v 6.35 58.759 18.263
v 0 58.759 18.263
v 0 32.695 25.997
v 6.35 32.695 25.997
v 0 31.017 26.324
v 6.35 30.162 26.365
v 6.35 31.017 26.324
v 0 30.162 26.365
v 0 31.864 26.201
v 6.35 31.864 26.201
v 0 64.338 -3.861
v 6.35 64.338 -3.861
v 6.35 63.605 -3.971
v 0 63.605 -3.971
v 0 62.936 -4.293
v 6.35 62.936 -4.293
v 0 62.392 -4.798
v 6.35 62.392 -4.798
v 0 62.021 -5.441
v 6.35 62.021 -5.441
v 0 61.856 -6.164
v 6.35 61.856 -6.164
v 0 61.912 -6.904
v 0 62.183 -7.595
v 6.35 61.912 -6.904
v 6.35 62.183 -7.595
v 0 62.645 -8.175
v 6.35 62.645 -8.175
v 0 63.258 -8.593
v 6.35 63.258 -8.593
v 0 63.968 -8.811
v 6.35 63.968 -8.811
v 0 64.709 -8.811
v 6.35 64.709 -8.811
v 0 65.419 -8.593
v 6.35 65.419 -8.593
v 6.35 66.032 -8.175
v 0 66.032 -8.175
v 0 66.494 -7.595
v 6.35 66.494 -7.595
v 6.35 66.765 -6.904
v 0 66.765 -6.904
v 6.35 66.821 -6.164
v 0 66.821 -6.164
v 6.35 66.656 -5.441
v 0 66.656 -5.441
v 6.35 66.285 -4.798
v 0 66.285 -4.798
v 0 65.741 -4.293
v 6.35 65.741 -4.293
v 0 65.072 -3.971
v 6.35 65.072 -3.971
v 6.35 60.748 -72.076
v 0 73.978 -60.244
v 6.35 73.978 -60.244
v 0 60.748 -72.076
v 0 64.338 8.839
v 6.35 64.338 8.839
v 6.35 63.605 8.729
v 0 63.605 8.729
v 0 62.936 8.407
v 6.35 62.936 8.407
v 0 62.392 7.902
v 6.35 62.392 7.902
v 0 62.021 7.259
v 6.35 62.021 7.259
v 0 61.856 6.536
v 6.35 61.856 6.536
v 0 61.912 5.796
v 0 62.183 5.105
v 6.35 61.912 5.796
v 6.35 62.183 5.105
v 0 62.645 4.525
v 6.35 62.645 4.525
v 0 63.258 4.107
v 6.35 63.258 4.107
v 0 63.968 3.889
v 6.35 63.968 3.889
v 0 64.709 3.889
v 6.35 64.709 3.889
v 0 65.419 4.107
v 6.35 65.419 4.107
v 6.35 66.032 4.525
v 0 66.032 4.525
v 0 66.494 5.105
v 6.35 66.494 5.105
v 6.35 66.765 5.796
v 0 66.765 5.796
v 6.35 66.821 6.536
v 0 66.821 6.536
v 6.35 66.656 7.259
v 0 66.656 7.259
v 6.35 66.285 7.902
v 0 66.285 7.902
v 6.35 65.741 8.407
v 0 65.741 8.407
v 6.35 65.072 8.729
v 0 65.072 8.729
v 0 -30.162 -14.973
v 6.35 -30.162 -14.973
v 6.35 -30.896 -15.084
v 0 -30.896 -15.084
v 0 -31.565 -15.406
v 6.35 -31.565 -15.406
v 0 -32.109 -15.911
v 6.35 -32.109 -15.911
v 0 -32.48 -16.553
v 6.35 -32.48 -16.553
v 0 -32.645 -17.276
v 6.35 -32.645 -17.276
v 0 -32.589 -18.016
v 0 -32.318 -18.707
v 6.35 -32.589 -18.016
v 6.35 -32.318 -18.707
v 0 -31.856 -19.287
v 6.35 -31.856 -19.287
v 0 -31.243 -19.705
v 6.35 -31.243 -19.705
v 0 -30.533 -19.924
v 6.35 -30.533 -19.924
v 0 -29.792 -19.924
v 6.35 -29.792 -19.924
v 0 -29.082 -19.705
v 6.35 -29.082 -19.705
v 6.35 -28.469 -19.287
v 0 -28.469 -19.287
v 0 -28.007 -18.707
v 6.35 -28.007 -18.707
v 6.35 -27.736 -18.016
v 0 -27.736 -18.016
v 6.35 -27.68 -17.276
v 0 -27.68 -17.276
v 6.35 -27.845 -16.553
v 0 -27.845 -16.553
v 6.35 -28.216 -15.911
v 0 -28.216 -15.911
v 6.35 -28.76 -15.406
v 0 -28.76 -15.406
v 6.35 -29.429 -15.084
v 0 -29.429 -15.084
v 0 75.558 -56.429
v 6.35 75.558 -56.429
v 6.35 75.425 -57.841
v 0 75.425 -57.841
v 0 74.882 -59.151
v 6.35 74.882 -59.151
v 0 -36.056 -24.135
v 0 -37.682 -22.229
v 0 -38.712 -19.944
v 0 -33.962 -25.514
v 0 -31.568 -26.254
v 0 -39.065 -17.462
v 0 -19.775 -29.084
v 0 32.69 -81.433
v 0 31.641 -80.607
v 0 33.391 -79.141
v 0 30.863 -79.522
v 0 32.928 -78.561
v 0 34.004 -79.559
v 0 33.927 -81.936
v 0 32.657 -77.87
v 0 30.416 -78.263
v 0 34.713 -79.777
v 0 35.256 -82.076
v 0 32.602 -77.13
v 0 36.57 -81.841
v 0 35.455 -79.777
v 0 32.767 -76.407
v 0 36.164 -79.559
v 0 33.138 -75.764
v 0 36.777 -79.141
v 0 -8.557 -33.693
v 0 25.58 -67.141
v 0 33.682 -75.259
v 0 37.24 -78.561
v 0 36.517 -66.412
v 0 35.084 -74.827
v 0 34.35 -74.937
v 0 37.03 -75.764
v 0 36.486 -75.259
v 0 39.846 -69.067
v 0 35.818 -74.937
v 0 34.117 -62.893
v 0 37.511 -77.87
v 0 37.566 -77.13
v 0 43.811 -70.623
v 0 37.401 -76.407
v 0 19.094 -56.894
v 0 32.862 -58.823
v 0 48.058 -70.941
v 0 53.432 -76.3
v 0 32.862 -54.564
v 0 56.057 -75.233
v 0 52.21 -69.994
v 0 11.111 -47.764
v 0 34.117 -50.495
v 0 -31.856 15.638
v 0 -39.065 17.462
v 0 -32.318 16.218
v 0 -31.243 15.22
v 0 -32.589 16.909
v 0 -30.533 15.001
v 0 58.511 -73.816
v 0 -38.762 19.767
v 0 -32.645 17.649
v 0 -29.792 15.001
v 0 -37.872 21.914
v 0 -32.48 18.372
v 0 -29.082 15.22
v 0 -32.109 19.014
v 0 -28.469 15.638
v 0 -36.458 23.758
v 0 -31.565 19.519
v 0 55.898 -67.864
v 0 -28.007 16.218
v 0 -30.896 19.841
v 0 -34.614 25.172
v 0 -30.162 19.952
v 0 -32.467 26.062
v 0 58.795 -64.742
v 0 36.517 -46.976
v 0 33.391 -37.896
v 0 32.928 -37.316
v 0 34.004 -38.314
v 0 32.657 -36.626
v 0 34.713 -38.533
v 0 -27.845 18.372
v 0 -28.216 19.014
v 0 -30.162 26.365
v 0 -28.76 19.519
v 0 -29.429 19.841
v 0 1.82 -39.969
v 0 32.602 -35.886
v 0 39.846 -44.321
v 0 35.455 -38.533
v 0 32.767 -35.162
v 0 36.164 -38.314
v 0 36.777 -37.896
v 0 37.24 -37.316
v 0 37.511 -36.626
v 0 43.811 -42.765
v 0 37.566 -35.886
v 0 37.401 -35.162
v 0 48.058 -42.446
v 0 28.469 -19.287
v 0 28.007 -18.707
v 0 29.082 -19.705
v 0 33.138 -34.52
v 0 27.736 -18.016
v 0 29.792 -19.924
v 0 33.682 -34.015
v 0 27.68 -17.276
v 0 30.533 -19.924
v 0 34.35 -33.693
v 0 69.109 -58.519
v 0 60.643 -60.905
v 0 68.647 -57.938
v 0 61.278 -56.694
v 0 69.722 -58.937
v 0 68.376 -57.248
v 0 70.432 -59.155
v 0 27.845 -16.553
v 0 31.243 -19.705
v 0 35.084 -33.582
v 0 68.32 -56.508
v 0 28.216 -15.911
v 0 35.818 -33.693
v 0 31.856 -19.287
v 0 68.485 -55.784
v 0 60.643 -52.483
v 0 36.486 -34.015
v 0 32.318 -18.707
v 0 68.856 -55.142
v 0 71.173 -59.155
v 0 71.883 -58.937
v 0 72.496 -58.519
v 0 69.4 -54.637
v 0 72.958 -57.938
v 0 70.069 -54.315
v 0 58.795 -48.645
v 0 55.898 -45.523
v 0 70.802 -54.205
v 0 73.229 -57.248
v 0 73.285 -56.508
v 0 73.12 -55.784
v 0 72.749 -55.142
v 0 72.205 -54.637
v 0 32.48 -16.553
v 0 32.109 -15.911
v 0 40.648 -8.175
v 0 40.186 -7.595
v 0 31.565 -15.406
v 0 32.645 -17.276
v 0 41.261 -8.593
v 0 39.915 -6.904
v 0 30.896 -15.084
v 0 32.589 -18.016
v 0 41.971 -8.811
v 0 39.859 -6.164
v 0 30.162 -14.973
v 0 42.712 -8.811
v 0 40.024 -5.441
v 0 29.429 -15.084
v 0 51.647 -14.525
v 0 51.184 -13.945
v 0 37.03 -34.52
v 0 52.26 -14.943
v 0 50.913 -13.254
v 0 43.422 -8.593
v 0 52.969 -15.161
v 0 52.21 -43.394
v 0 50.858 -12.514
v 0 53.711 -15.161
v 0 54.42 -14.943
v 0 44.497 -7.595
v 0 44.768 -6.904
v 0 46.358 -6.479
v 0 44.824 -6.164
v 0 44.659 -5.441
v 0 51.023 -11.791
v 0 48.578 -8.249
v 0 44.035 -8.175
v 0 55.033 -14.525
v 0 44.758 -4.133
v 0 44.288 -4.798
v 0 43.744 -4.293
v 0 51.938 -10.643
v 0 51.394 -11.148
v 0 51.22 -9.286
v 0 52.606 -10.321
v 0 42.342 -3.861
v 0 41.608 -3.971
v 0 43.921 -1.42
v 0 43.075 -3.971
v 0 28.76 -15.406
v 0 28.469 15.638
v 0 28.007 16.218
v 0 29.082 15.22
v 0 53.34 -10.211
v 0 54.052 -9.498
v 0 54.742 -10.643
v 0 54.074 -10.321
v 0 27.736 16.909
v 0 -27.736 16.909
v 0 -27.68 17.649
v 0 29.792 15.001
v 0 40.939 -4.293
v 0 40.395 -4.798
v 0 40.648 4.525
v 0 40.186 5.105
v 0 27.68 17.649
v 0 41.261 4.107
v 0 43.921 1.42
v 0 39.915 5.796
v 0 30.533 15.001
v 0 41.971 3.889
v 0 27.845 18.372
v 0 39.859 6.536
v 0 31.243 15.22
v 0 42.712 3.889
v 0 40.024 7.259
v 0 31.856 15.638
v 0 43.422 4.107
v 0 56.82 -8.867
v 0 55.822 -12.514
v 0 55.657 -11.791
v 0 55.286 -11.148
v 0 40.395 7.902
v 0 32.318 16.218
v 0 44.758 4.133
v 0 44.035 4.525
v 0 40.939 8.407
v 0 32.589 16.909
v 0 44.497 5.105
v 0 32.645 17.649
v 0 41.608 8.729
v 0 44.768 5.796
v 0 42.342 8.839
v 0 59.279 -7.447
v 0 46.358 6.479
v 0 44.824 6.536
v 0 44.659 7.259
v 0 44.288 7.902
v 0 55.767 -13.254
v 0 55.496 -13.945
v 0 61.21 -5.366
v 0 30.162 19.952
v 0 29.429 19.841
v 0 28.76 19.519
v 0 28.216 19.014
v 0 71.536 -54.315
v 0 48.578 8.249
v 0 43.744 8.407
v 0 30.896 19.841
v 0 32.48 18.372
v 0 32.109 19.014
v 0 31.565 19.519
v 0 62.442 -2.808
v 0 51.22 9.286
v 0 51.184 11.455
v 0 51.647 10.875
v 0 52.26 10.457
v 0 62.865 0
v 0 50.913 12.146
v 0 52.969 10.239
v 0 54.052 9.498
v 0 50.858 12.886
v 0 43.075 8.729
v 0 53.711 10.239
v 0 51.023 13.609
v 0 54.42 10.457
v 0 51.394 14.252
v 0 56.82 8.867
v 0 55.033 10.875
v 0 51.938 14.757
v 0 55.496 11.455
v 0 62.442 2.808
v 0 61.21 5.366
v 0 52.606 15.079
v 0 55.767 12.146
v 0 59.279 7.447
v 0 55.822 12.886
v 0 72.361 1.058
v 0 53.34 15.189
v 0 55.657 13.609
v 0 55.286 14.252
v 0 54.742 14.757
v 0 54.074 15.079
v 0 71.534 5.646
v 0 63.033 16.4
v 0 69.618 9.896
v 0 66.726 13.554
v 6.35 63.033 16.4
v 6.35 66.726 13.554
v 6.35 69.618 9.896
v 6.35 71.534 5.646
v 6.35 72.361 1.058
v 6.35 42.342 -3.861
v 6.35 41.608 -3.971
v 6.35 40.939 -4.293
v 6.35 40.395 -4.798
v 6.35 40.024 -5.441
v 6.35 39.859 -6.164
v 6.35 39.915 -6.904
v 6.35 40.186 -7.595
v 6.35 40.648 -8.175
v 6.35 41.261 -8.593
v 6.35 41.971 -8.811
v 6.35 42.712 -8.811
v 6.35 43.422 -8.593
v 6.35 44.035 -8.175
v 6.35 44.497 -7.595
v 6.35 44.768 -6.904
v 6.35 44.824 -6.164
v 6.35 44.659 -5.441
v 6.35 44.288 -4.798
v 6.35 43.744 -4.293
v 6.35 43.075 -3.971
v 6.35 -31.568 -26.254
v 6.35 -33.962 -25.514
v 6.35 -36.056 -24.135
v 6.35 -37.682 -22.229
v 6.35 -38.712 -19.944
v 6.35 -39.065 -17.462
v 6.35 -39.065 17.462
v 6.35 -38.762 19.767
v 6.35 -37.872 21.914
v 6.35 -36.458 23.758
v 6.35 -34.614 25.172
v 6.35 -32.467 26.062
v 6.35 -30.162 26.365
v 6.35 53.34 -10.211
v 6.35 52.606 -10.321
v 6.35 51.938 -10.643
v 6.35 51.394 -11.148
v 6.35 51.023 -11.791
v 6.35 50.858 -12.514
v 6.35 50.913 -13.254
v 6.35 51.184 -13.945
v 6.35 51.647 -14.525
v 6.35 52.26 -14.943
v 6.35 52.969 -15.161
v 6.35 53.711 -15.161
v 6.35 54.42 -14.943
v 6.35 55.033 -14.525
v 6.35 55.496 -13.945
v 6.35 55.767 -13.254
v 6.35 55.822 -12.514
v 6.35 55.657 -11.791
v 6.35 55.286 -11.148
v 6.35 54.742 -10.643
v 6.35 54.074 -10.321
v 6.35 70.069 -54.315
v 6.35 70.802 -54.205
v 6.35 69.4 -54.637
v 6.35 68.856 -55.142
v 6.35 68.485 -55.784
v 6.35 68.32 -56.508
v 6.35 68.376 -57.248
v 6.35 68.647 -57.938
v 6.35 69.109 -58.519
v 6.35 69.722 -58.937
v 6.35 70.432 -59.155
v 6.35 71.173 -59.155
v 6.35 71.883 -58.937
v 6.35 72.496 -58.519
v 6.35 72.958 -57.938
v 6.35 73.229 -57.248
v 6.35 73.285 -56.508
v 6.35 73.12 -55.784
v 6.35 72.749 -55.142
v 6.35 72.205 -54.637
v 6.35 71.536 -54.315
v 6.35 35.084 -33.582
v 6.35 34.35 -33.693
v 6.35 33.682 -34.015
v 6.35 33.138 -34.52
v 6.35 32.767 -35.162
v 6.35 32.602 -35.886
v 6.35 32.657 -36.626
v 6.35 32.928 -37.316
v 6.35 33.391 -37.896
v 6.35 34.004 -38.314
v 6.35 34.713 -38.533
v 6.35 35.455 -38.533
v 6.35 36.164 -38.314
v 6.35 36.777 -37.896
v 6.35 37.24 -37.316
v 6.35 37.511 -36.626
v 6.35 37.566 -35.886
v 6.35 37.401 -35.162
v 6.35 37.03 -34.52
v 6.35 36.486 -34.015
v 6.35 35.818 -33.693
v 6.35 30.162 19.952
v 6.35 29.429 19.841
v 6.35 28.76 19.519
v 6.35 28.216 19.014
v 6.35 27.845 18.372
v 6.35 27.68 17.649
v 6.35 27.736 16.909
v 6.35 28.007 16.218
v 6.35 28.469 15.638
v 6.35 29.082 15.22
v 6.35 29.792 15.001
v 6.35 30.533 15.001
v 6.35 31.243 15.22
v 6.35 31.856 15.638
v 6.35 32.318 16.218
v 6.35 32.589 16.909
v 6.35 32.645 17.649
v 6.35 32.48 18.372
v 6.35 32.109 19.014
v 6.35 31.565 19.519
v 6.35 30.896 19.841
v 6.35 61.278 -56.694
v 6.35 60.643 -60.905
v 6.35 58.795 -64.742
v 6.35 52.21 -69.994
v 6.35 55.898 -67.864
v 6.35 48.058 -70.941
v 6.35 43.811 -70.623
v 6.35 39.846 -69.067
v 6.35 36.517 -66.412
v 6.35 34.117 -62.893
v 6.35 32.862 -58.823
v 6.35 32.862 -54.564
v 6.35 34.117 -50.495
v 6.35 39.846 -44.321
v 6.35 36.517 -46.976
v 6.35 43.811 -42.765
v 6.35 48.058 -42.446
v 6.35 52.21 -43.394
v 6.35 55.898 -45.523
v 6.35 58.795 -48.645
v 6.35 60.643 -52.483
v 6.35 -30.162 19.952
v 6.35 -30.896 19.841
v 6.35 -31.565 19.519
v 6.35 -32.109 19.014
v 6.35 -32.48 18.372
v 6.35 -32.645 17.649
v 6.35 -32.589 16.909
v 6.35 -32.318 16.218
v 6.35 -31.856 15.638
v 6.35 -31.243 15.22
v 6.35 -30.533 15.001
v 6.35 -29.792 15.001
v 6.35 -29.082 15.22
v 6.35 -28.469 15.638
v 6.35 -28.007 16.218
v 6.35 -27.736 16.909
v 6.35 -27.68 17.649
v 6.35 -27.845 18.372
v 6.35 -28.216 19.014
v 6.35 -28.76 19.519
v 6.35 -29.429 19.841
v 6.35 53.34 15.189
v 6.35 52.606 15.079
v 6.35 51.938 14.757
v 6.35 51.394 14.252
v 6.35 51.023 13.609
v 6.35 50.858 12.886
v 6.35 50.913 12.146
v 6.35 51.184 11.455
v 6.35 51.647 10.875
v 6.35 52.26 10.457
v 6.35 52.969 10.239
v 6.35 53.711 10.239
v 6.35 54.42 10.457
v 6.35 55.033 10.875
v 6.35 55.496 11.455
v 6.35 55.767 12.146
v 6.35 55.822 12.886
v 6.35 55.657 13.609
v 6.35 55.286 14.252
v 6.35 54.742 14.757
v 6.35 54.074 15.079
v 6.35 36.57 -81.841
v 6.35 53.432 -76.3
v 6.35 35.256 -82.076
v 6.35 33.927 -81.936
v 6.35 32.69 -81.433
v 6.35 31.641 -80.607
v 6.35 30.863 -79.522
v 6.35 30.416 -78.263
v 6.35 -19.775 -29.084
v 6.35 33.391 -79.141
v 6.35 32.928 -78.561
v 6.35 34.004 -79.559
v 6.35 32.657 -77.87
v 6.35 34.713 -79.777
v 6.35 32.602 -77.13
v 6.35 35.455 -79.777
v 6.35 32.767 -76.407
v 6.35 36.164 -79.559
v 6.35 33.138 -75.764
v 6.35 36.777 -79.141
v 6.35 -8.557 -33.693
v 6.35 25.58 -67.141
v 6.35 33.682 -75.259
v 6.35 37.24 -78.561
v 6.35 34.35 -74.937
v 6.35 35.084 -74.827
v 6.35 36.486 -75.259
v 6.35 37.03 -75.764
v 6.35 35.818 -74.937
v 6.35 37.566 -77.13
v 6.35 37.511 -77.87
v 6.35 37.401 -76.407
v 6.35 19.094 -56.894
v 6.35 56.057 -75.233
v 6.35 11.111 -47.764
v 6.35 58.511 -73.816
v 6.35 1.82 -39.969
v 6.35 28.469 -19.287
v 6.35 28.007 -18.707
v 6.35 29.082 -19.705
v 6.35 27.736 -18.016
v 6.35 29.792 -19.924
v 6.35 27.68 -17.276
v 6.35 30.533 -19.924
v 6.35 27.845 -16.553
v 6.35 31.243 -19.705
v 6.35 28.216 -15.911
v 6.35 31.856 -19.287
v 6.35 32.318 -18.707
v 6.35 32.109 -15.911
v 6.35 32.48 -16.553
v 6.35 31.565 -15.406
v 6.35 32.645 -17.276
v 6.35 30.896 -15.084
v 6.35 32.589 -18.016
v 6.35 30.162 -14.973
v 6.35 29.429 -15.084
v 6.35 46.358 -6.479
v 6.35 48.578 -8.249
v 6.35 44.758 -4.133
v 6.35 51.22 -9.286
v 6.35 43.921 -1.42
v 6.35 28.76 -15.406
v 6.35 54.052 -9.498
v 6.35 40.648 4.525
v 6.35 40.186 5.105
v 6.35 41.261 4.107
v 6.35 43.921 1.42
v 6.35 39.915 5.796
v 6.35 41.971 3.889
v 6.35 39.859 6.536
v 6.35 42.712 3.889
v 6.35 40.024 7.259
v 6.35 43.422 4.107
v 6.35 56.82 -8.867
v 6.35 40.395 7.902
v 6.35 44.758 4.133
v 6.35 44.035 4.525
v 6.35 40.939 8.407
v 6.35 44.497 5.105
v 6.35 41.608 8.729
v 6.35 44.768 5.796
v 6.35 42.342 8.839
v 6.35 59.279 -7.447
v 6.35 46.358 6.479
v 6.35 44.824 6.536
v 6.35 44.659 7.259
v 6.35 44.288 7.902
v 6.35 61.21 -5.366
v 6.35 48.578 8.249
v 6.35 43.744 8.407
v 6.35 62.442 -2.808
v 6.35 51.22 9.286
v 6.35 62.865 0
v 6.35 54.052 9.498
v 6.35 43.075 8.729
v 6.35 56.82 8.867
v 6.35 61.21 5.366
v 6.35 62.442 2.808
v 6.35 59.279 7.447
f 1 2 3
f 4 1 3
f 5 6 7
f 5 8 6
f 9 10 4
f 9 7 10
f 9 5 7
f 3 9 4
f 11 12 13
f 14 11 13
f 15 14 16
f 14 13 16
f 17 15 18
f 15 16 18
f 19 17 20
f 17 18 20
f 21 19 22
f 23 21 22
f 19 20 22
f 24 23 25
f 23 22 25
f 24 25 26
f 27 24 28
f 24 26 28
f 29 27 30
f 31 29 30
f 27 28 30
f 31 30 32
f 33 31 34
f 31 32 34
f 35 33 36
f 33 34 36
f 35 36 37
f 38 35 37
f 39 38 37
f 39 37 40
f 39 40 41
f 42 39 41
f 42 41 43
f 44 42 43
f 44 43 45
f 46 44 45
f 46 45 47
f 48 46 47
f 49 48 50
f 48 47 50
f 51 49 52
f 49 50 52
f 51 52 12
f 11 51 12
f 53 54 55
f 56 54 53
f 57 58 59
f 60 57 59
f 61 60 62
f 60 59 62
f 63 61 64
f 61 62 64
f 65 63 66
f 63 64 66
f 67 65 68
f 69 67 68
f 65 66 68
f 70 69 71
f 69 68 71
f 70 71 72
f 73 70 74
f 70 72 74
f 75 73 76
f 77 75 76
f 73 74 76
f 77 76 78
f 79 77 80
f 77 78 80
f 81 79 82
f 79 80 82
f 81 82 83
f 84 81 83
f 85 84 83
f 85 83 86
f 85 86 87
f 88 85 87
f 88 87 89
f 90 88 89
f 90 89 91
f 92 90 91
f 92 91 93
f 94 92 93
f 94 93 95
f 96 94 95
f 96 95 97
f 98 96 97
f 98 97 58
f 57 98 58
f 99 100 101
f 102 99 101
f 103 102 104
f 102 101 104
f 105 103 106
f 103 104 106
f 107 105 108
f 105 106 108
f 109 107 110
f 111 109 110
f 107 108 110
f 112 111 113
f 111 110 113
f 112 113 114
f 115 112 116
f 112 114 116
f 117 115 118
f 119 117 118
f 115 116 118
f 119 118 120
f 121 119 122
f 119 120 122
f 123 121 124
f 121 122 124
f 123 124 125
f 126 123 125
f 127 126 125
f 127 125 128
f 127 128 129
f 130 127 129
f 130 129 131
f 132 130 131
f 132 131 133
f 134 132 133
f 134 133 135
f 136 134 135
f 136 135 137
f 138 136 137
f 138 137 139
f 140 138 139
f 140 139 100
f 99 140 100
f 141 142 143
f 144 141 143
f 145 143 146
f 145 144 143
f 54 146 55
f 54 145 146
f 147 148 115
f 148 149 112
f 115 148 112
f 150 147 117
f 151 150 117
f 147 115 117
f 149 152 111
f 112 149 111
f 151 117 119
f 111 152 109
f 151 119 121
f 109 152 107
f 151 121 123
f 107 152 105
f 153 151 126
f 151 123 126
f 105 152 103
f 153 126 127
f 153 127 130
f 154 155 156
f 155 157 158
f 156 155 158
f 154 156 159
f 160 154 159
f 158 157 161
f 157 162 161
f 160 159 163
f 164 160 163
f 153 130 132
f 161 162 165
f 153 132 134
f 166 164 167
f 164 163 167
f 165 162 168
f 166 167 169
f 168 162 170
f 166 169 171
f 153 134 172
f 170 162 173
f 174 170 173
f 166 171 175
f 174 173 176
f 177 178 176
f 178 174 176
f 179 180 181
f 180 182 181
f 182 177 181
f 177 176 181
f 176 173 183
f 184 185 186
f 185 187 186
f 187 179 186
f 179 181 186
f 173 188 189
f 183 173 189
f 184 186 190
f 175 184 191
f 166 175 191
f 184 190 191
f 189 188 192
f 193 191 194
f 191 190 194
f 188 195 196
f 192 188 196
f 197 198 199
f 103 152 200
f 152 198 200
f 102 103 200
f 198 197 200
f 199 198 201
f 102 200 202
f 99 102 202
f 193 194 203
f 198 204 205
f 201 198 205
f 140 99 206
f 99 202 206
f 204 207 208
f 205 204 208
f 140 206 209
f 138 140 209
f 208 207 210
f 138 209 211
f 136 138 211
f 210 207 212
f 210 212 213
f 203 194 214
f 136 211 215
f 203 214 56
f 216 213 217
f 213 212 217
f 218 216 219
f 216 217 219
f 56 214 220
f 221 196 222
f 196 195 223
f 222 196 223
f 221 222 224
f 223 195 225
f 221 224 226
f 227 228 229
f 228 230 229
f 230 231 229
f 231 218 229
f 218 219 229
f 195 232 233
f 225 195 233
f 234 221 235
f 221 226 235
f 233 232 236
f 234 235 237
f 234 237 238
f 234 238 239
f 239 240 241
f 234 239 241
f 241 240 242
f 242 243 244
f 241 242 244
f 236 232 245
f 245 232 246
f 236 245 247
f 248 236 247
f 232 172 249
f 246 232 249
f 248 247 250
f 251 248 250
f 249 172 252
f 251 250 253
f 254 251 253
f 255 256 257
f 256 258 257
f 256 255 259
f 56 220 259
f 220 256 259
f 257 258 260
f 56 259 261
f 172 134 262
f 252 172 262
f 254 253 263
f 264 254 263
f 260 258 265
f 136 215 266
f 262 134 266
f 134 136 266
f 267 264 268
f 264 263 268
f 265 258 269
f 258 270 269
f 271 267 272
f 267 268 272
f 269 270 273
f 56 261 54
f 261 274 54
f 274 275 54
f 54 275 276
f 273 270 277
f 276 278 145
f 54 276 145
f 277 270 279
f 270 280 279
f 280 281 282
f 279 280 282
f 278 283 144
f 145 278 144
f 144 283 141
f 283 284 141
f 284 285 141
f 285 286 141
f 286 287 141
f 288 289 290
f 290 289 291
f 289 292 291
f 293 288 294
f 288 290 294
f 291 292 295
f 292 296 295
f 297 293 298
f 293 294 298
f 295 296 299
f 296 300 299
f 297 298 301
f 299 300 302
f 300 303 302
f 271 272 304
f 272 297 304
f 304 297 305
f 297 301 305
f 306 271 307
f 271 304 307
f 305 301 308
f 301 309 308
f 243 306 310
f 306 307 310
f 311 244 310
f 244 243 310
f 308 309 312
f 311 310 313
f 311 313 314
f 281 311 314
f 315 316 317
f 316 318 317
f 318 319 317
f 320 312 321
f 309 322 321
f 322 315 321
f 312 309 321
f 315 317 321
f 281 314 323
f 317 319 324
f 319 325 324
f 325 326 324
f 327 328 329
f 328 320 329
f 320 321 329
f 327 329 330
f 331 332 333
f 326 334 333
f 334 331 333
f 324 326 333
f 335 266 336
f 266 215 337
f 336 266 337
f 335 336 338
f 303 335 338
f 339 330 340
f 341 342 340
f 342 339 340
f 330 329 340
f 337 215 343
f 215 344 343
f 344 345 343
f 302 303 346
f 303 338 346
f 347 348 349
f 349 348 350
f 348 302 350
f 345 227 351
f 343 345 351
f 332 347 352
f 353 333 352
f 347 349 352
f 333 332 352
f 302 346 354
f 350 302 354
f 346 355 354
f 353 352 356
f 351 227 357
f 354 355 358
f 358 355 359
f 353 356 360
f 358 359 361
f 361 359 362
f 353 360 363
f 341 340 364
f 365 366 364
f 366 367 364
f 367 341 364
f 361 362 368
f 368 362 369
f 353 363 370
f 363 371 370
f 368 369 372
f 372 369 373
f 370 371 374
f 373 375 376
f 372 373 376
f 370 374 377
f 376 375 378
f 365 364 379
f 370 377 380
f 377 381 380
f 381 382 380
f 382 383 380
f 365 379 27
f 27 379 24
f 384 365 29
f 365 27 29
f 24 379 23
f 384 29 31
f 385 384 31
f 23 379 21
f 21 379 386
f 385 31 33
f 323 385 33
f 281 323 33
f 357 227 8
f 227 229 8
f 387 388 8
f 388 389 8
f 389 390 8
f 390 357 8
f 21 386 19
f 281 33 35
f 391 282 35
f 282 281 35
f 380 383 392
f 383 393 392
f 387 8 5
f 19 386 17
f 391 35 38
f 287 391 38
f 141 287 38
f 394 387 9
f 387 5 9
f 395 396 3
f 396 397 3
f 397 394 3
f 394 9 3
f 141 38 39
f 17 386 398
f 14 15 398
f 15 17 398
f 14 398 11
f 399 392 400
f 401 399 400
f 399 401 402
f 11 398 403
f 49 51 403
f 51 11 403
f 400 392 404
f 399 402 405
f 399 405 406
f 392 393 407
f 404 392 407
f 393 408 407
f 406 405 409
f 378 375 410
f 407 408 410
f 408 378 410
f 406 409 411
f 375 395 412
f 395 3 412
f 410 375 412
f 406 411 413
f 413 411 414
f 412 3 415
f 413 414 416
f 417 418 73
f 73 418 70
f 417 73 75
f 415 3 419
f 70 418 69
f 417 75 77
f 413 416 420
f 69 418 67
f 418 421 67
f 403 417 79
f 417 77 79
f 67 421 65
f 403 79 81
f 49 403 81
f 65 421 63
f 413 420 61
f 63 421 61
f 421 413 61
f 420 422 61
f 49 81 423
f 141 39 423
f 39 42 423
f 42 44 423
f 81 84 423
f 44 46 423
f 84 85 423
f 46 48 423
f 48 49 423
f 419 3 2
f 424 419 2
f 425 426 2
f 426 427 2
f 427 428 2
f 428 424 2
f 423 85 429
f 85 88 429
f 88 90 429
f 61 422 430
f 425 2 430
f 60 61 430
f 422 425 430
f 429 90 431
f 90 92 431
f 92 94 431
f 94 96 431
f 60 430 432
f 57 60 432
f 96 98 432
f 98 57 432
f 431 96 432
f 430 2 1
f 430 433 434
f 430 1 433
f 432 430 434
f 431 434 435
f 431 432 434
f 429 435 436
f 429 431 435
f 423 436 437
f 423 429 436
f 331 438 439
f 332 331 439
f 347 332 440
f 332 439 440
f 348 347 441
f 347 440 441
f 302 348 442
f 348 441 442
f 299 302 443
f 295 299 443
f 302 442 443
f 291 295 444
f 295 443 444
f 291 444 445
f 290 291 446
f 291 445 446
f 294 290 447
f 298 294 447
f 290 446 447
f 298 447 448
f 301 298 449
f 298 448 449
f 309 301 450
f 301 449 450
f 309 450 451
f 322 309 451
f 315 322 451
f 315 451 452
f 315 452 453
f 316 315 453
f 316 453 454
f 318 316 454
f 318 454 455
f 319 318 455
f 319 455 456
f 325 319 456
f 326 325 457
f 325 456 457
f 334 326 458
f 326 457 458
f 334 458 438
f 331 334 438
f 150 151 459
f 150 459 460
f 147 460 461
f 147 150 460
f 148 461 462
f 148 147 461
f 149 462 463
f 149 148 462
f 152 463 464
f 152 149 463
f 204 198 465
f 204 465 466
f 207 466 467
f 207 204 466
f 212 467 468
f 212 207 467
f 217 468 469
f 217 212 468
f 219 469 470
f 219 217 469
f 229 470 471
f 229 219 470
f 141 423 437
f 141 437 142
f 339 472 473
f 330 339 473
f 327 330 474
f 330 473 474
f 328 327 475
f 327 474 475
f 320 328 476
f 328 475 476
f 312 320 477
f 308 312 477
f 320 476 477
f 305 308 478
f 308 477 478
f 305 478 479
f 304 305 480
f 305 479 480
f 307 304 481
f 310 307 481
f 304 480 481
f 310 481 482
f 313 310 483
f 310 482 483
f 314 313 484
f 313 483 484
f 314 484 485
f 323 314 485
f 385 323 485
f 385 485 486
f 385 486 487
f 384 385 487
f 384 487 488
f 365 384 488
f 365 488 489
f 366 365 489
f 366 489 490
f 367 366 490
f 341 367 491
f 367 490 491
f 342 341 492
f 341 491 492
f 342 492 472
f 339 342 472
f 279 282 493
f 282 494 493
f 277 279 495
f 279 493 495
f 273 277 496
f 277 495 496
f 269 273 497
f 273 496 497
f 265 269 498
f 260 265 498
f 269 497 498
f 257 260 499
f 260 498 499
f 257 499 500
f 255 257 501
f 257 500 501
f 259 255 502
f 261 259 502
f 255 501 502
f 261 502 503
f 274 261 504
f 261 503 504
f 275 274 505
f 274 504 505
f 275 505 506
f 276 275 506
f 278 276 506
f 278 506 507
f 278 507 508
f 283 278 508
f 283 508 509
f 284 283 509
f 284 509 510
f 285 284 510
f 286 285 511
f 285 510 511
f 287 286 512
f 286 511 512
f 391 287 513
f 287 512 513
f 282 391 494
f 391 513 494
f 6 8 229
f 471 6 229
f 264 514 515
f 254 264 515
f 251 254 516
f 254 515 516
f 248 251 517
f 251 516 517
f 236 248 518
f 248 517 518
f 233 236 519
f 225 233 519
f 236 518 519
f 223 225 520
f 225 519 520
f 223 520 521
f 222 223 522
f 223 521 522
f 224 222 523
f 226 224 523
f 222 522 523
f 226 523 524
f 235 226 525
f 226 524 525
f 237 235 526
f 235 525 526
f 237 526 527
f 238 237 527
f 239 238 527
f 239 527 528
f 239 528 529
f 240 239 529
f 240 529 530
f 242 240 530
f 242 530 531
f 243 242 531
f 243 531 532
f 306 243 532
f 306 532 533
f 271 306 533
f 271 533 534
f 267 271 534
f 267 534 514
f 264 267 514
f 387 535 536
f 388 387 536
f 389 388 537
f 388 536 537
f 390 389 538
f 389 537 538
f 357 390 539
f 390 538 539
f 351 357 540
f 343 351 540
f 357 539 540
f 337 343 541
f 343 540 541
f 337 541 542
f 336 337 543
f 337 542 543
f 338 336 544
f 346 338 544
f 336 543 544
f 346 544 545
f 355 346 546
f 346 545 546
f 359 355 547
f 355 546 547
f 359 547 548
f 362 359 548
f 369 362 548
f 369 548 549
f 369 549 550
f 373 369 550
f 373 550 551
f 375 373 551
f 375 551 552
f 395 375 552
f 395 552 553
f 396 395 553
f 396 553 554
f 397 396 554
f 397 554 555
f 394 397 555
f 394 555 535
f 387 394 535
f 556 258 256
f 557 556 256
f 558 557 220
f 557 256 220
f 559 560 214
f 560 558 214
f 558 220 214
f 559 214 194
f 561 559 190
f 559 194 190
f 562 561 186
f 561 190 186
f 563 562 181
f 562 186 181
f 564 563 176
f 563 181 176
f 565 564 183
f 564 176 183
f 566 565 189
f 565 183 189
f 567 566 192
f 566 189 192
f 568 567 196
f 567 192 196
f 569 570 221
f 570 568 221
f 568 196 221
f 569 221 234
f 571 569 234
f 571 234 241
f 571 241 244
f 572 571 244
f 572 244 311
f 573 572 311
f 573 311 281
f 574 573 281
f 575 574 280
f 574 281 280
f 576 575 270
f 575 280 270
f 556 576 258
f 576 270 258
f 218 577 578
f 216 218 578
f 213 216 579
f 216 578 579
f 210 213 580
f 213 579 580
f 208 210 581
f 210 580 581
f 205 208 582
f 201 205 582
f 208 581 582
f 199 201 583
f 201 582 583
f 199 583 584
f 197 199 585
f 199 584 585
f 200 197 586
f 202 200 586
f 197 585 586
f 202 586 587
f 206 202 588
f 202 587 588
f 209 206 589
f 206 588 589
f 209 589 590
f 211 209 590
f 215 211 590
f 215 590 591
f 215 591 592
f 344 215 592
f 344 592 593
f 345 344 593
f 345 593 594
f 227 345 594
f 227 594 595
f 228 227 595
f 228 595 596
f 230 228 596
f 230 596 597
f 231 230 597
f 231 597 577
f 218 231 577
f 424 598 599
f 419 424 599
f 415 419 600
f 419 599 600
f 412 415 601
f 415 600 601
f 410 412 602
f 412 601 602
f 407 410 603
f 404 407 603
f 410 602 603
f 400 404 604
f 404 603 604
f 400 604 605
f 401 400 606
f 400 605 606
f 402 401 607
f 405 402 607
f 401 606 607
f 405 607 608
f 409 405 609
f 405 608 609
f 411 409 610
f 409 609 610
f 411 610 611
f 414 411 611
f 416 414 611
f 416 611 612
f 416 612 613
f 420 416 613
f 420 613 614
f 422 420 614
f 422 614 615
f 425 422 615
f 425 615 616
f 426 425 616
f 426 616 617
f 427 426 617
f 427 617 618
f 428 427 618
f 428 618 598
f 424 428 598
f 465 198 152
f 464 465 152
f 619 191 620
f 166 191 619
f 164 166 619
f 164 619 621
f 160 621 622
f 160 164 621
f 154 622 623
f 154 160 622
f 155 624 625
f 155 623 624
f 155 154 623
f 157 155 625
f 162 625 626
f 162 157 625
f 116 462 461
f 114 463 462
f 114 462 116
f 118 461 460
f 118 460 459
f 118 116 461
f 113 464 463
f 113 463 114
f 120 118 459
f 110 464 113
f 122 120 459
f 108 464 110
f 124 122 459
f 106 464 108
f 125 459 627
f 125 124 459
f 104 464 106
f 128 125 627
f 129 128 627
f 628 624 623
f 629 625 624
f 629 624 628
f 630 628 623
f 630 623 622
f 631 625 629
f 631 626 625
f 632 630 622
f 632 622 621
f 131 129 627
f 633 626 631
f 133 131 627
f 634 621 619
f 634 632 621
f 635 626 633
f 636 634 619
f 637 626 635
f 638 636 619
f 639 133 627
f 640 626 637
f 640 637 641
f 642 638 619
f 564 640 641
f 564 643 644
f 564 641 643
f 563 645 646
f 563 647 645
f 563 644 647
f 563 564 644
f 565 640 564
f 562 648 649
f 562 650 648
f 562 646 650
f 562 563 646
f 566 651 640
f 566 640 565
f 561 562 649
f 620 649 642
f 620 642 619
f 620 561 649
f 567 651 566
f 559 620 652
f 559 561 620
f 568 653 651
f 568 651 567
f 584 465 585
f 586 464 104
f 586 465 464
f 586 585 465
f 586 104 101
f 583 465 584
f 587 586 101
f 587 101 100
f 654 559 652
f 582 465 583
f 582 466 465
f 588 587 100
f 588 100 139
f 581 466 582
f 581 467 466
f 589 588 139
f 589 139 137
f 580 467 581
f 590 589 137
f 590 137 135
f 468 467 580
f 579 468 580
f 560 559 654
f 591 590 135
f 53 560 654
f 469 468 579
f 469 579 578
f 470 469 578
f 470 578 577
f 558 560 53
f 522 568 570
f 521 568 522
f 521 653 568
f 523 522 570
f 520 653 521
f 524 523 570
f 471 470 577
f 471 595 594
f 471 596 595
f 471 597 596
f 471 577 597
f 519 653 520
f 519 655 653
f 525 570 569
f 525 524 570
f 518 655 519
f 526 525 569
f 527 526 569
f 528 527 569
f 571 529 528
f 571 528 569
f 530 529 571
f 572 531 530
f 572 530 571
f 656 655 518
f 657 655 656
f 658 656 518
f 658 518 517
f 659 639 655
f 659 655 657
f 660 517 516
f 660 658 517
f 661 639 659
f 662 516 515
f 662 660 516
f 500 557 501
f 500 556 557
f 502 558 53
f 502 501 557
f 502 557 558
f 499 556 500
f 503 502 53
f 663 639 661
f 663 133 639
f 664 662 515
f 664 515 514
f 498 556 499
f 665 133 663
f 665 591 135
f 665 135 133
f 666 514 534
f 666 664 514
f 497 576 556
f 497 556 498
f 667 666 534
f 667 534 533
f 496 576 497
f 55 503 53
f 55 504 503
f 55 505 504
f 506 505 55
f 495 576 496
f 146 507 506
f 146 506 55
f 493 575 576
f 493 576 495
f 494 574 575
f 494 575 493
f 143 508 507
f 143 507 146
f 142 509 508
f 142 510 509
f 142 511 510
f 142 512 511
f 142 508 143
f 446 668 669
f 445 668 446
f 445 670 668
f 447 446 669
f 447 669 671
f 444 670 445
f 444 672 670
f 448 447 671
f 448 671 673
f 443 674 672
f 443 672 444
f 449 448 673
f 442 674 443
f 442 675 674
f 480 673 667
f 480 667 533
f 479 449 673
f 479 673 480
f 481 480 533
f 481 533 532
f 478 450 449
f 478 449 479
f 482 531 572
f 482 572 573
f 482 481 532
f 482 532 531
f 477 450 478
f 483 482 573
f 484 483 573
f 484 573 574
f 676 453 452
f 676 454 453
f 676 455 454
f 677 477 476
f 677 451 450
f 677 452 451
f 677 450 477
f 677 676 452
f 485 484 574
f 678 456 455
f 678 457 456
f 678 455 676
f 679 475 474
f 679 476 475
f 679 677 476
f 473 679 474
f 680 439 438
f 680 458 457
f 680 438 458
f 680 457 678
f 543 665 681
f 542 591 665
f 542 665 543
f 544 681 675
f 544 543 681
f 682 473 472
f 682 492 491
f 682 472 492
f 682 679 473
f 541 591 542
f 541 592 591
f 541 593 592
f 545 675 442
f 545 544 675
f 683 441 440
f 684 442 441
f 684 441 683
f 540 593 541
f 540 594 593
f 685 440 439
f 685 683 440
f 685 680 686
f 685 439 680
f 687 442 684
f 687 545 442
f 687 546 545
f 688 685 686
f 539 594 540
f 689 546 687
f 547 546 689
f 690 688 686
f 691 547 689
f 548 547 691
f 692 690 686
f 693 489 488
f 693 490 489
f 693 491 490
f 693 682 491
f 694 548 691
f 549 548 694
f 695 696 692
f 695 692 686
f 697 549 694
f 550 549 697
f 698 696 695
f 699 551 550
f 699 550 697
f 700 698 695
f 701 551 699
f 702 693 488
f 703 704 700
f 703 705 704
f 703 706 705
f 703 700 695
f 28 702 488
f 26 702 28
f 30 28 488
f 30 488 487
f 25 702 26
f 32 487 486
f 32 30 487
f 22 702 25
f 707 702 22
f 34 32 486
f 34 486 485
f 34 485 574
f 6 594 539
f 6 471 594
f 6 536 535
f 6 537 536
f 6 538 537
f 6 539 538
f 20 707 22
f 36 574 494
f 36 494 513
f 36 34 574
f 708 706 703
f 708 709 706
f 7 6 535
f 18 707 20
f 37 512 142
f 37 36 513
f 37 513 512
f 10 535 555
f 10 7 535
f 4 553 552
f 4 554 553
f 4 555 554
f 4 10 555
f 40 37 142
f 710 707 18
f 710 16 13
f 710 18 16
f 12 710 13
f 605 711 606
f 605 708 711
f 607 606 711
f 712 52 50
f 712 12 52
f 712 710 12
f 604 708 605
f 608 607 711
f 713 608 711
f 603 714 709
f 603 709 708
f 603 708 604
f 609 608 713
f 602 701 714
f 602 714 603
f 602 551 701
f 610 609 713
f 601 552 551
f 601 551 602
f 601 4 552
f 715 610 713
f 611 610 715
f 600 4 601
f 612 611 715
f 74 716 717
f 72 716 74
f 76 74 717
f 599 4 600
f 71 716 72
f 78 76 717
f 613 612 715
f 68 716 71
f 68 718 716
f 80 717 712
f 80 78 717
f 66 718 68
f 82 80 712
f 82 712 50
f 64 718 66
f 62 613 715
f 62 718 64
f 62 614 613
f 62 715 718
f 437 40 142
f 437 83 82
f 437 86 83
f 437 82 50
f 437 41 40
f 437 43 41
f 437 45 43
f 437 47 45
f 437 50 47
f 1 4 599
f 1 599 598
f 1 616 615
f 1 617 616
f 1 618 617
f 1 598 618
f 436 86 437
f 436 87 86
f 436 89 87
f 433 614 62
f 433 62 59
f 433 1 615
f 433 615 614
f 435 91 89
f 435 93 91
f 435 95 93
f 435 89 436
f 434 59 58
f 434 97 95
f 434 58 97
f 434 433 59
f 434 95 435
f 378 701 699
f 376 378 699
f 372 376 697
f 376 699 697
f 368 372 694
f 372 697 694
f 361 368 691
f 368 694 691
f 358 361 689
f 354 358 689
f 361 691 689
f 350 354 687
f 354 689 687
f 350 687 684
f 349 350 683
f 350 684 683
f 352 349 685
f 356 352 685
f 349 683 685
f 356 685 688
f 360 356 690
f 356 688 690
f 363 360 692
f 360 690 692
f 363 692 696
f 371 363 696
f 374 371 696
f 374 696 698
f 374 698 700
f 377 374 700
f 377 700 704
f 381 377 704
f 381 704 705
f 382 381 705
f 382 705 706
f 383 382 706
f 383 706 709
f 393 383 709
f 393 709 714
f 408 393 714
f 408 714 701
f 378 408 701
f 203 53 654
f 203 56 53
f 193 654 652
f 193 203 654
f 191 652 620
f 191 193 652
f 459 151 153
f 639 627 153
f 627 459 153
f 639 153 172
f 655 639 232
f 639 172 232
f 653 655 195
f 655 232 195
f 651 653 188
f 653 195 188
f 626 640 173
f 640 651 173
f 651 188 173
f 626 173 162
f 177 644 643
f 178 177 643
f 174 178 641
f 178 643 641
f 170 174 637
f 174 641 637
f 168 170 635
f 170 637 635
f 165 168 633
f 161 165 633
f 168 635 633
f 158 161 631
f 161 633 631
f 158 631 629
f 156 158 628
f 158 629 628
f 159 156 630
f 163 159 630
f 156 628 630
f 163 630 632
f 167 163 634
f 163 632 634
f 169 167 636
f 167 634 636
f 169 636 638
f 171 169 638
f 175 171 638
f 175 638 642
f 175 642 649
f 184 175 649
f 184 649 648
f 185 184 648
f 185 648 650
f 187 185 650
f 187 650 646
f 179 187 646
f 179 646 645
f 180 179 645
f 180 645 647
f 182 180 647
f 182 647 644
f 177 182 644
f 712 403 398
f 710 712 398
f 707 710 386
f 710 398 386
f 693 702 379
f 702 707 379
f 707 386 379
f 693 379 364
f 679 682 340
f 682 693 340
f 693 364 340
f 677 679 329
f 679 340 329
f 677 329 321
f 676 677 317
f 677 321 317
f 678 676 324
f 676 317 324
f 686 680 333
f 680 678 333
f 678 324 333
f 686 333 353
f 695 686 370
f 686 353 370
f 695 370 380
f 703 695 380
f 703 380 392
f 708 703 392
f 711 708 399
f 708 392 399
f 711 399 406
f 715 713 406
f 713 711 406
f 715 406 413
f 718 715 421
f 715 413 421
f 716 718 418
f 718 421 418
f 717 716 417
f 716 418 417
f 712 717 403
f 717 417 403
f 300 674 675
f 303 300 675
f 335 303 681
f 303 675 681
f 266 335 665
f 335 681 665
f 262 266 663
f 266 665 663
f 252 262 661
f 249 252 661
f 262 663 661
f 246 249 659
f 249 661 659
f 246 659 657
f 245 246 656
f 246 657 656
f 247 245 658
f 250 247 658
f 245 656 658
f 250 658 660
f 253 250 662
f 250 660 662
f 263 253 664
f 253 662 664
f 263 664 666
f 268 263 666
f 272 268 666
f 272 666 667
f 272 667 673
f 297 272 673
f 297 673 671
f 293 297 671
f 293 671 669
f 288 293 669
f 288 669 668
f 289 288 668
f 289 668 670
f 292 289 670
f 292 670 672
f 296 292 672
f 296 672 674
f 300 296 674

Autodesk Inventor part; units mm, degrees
ref_plane "YZ Plane" through (0, 0, 0) normal (1, 0, 0) x (0, 1, 0)
ref_plane "XZ Plane" through (0, 0, 0) normal (0, 1, 0) x (-1, 0, 0)
ref_plane "XY Plane" through (0, 0, 0) normal (0, 0, 1) x (1, 0, 0)
sketch "Sketch1" plane through (0, 0, 0) normal (1, 0, 0) x (0, 1, 0)
  circle A0 centre (0, 0) radius 38.1 construction
  line L0 (27.94, -25.903) -> (27.94, -76.2) construction
  line L1 (27.94, -76.2) -> (-27.94, -76.2) construction
  line L2 (-27.94, -76.2) -> (-27.94, -25.903) construction
  line L3 (-30.1625, -17.4625) -> (30.1625, -17.4625) construction
  line L4 (30.1625, -17.4625) -> (30.1625, 17.4625) construction
  line L5 (30.1625, 17.4625) -> (-30.1625, 17.4625) construction
  line L6 (-30.1625, 17.4625) -> (-30.1625, -17.4625) construction
  line L7 (-30.1625, -17.4625) -> (30.1625, 17.4625) construction
  line L8 (30.1625, -17.4625) -> (-30.1625, 17.4625) construction
  circle A1 centre (30.1625, 17.4625) radius 2.5527 construction
  circle A2 centre (30.1625, -17.4625) radius 2.5527 construction
  circle A3 centre (-30.1625, -17.4625) radius 2.5527 construction
  circle A4 centre (-30.1625, 17.4625) radius 2.5527 construction
  point P0 (0, -76.2)
  dimension "d0" = 76.2
  dimension "d1" = 55.88
  dimension "d2" = 76.2
  dimension "d3" = 60.325
  dimension "d4" = 34.925
  dimension "d5" = 5.1054
  dimension "d6" = 5.1054
  dimension "d7" = 5.1054
  dimension "d8" = 5.1054
sketch "Sketch2" plane through (0, 0, 0) normal (1, 0, 0) x (0, 1, 0)
  line L0 (-30.1625, -17.4625) -> (30.1625, -17.4625) construction
  circle A0 centre (30.1625, -17.4625) radius 2.5527 construction
  circle A1 centre (-30.1625, -17.4625) radius 2.5527 construction
  line L1 (-30.1625, 17.4625) -> (-30.1625, -17.4625) construction
  circle A2 centre (-30.1625, 17.4625) radius 2.5527 construction
  line L2 (30.1625, -17.4625) -> (30.1625, 17.4625) construction
  line L3 (30.1625, -17.4625) -> (-30.1625, 17.4625) construction
  line L4 (30.1625, 17.4625) -> (-30.1625, 17.4625) construction
  line L5 (-30.1625, -17.4625) -> (30.1625, 17.4625) construction
  circle A3 centre (30.1625, 17.4625) radius 2.5527 construction
  circle A4 centre (0, 0) radius 38.1 construction
  line L6 (27.94, -25.903) -> (27.94, -76.2) construction
  line L7 (27.94, -76.2) -> (-27.94, -76.2) construction
  line L8 (-27.94, -76.2) -> (-27.94, -25.903) construction
  circle A5 centre (53.34, 0) radius 12.7 construction
  circle A6 centre (46.99, -56.6939) radius 14.2875
  circle A7 centre (46.99, -56.6939) radius 30.5054 construction
  circle A8 centre (53.34, 0) radius 9.525
  circle A9 centre (53.34, 0) radius 19.05 construction
  circle A10 centre (46.99, -56.6939) radius 20.6375 construction
  circle A11 centre (30.1625, 17.4625) radius 8.9027 construction
  circle A12 centre (30.1625, -17.4625) radius 8.9027 construction
  circle A13 centre (-30.1625, -17.4625) radius 8.9027 construction
  circle A14 centre (-30.1625, 17.4625) radius 8.9027 construction
  line L9 (58.7594, 18.2629) -> (32.6952, 25.9973)
  line L10 (30.1625, 26.3652) -> (-30.1625, 26.3652)
  line L11 (-39.0652, 17.4625) -> (-39.0652, -17.4625)
  arc A15 (72.3606, 1.0578) -> (58.7594, 18.2629) centre (53.34, 0) ccw
  arc A16 (32.6952, 25.9973) -> (30.1625, 26.3652) centre (30.1625, 17.4625) ccw
  arc A17 (-30.1625, 26.3652) -> (-39.0652, 17.4625) centre (-30.1625, 17.4625) ccw
  arc A18 (-39.0652, -17.4625) -> (-31.5677, -26.2536) centre (-30.1625, -17.4625) ccw
  circle A19 centre (46.99, -56.6939) radius 23.8125 construction
  circle A20 centre (35.0838, -36.0717) radius 4.7625 construction
  circle A21 centre (35.0838, -77.3161) radius 4.7625 construction
  circle A22 centre (70.8025, -56.6939) radius 4.7625 construction
  line L12 (72.3606, 1.0578) -> (75.5577, -56.4294)
  arc A23 (73.9775, -60.2437) -> (75.5577, -56.4294) centre (70.8025, -56.6939) ccw
  arc A24 (30.4163, -78.263) -> (36.5704, -81.8406) centre (35.0838, -77.3161) ccw
  arc A25 (30.4163, -78.263) -> (-31.5677, -26.2536) centre (-43.9964, -104.0065) ccw
  line L13 (73.9775, -60.2437) -> (60.7483, -72.0762)
  line L14 (53.4323, -76.3001) -> (36.5704, -81.8406)
  arc A26 (53.4323, -76.3001) -> (60.7483, -72.0762) centre (46.99, -56.6939) ccw
  point P0 (0, -76.2)
  point P1 (64.3385, -6.35)
  point P2 (64.3385, 6.35)
  point P3 (53.34, 12.7)
  point P4 (42.3415, 6.35)
  point P5 (42.3415, -6.35)
  point P6 (53.34, -12.7)
  dimension "d9" = 25.4
  dimension "d10" = 25.4
  dimension "d11" = 76.2
  dimension "d14" = 360
  dimension "d16" = 28.575
  dimension "d17" = 57.0484
  dimension "d18" = 19.05
  dimension "d19" = 61.0108
  dimension "d20" = 19.05
  dimension "d21" = 6.35
  dimension "d22" = 6.35
  dimension "d23" = 6.35
  dimension "d40" = 9.525
  dimension "d43" = 360
  dimension "d45" = 9.525
  dimension "d46" = 9.525
  dimension "d47" = 9.525
  dimension "d48" = 78.74
extrude "Extrusion1" add sketch "Sketch2" along normal blind 6.35
hole "Motor Mount Holes" at (0, -30.1625, -17.4625) at (0, 30.1625, -17.4625) at (0, -30.1625, 17.4625) at (0, 30.1625, 17.4625) at (0, 0, -76.2) at (0, 64.3385, -6.35) at (0, 64.3385, 6.35) at (0, 53.34, 12.7) at (0, 42.3415, 6.35) at (0, 42.3415, -6.35) at (0, 53.34, -12.7) direction (1, 0, 0) diameter 4.9784 end through all clearance for "Flat Head Machine Screw (82)" size "#10" standard "Ansi Unified Screw Threads"
hole "Hole3" at (0, 70.8025, -56.6939) at (0, 35.0838, -36.0717) at (0, 35.0838, -77.3161) direction (1, 0, 0) diameter 4.9784 end through all clearance for "Flat Head Machine Screw (82)" size "#10" standard "Ansi Unified Screw Threads"
properties part number "EL2-A-011" material "Aluminum 6061"
